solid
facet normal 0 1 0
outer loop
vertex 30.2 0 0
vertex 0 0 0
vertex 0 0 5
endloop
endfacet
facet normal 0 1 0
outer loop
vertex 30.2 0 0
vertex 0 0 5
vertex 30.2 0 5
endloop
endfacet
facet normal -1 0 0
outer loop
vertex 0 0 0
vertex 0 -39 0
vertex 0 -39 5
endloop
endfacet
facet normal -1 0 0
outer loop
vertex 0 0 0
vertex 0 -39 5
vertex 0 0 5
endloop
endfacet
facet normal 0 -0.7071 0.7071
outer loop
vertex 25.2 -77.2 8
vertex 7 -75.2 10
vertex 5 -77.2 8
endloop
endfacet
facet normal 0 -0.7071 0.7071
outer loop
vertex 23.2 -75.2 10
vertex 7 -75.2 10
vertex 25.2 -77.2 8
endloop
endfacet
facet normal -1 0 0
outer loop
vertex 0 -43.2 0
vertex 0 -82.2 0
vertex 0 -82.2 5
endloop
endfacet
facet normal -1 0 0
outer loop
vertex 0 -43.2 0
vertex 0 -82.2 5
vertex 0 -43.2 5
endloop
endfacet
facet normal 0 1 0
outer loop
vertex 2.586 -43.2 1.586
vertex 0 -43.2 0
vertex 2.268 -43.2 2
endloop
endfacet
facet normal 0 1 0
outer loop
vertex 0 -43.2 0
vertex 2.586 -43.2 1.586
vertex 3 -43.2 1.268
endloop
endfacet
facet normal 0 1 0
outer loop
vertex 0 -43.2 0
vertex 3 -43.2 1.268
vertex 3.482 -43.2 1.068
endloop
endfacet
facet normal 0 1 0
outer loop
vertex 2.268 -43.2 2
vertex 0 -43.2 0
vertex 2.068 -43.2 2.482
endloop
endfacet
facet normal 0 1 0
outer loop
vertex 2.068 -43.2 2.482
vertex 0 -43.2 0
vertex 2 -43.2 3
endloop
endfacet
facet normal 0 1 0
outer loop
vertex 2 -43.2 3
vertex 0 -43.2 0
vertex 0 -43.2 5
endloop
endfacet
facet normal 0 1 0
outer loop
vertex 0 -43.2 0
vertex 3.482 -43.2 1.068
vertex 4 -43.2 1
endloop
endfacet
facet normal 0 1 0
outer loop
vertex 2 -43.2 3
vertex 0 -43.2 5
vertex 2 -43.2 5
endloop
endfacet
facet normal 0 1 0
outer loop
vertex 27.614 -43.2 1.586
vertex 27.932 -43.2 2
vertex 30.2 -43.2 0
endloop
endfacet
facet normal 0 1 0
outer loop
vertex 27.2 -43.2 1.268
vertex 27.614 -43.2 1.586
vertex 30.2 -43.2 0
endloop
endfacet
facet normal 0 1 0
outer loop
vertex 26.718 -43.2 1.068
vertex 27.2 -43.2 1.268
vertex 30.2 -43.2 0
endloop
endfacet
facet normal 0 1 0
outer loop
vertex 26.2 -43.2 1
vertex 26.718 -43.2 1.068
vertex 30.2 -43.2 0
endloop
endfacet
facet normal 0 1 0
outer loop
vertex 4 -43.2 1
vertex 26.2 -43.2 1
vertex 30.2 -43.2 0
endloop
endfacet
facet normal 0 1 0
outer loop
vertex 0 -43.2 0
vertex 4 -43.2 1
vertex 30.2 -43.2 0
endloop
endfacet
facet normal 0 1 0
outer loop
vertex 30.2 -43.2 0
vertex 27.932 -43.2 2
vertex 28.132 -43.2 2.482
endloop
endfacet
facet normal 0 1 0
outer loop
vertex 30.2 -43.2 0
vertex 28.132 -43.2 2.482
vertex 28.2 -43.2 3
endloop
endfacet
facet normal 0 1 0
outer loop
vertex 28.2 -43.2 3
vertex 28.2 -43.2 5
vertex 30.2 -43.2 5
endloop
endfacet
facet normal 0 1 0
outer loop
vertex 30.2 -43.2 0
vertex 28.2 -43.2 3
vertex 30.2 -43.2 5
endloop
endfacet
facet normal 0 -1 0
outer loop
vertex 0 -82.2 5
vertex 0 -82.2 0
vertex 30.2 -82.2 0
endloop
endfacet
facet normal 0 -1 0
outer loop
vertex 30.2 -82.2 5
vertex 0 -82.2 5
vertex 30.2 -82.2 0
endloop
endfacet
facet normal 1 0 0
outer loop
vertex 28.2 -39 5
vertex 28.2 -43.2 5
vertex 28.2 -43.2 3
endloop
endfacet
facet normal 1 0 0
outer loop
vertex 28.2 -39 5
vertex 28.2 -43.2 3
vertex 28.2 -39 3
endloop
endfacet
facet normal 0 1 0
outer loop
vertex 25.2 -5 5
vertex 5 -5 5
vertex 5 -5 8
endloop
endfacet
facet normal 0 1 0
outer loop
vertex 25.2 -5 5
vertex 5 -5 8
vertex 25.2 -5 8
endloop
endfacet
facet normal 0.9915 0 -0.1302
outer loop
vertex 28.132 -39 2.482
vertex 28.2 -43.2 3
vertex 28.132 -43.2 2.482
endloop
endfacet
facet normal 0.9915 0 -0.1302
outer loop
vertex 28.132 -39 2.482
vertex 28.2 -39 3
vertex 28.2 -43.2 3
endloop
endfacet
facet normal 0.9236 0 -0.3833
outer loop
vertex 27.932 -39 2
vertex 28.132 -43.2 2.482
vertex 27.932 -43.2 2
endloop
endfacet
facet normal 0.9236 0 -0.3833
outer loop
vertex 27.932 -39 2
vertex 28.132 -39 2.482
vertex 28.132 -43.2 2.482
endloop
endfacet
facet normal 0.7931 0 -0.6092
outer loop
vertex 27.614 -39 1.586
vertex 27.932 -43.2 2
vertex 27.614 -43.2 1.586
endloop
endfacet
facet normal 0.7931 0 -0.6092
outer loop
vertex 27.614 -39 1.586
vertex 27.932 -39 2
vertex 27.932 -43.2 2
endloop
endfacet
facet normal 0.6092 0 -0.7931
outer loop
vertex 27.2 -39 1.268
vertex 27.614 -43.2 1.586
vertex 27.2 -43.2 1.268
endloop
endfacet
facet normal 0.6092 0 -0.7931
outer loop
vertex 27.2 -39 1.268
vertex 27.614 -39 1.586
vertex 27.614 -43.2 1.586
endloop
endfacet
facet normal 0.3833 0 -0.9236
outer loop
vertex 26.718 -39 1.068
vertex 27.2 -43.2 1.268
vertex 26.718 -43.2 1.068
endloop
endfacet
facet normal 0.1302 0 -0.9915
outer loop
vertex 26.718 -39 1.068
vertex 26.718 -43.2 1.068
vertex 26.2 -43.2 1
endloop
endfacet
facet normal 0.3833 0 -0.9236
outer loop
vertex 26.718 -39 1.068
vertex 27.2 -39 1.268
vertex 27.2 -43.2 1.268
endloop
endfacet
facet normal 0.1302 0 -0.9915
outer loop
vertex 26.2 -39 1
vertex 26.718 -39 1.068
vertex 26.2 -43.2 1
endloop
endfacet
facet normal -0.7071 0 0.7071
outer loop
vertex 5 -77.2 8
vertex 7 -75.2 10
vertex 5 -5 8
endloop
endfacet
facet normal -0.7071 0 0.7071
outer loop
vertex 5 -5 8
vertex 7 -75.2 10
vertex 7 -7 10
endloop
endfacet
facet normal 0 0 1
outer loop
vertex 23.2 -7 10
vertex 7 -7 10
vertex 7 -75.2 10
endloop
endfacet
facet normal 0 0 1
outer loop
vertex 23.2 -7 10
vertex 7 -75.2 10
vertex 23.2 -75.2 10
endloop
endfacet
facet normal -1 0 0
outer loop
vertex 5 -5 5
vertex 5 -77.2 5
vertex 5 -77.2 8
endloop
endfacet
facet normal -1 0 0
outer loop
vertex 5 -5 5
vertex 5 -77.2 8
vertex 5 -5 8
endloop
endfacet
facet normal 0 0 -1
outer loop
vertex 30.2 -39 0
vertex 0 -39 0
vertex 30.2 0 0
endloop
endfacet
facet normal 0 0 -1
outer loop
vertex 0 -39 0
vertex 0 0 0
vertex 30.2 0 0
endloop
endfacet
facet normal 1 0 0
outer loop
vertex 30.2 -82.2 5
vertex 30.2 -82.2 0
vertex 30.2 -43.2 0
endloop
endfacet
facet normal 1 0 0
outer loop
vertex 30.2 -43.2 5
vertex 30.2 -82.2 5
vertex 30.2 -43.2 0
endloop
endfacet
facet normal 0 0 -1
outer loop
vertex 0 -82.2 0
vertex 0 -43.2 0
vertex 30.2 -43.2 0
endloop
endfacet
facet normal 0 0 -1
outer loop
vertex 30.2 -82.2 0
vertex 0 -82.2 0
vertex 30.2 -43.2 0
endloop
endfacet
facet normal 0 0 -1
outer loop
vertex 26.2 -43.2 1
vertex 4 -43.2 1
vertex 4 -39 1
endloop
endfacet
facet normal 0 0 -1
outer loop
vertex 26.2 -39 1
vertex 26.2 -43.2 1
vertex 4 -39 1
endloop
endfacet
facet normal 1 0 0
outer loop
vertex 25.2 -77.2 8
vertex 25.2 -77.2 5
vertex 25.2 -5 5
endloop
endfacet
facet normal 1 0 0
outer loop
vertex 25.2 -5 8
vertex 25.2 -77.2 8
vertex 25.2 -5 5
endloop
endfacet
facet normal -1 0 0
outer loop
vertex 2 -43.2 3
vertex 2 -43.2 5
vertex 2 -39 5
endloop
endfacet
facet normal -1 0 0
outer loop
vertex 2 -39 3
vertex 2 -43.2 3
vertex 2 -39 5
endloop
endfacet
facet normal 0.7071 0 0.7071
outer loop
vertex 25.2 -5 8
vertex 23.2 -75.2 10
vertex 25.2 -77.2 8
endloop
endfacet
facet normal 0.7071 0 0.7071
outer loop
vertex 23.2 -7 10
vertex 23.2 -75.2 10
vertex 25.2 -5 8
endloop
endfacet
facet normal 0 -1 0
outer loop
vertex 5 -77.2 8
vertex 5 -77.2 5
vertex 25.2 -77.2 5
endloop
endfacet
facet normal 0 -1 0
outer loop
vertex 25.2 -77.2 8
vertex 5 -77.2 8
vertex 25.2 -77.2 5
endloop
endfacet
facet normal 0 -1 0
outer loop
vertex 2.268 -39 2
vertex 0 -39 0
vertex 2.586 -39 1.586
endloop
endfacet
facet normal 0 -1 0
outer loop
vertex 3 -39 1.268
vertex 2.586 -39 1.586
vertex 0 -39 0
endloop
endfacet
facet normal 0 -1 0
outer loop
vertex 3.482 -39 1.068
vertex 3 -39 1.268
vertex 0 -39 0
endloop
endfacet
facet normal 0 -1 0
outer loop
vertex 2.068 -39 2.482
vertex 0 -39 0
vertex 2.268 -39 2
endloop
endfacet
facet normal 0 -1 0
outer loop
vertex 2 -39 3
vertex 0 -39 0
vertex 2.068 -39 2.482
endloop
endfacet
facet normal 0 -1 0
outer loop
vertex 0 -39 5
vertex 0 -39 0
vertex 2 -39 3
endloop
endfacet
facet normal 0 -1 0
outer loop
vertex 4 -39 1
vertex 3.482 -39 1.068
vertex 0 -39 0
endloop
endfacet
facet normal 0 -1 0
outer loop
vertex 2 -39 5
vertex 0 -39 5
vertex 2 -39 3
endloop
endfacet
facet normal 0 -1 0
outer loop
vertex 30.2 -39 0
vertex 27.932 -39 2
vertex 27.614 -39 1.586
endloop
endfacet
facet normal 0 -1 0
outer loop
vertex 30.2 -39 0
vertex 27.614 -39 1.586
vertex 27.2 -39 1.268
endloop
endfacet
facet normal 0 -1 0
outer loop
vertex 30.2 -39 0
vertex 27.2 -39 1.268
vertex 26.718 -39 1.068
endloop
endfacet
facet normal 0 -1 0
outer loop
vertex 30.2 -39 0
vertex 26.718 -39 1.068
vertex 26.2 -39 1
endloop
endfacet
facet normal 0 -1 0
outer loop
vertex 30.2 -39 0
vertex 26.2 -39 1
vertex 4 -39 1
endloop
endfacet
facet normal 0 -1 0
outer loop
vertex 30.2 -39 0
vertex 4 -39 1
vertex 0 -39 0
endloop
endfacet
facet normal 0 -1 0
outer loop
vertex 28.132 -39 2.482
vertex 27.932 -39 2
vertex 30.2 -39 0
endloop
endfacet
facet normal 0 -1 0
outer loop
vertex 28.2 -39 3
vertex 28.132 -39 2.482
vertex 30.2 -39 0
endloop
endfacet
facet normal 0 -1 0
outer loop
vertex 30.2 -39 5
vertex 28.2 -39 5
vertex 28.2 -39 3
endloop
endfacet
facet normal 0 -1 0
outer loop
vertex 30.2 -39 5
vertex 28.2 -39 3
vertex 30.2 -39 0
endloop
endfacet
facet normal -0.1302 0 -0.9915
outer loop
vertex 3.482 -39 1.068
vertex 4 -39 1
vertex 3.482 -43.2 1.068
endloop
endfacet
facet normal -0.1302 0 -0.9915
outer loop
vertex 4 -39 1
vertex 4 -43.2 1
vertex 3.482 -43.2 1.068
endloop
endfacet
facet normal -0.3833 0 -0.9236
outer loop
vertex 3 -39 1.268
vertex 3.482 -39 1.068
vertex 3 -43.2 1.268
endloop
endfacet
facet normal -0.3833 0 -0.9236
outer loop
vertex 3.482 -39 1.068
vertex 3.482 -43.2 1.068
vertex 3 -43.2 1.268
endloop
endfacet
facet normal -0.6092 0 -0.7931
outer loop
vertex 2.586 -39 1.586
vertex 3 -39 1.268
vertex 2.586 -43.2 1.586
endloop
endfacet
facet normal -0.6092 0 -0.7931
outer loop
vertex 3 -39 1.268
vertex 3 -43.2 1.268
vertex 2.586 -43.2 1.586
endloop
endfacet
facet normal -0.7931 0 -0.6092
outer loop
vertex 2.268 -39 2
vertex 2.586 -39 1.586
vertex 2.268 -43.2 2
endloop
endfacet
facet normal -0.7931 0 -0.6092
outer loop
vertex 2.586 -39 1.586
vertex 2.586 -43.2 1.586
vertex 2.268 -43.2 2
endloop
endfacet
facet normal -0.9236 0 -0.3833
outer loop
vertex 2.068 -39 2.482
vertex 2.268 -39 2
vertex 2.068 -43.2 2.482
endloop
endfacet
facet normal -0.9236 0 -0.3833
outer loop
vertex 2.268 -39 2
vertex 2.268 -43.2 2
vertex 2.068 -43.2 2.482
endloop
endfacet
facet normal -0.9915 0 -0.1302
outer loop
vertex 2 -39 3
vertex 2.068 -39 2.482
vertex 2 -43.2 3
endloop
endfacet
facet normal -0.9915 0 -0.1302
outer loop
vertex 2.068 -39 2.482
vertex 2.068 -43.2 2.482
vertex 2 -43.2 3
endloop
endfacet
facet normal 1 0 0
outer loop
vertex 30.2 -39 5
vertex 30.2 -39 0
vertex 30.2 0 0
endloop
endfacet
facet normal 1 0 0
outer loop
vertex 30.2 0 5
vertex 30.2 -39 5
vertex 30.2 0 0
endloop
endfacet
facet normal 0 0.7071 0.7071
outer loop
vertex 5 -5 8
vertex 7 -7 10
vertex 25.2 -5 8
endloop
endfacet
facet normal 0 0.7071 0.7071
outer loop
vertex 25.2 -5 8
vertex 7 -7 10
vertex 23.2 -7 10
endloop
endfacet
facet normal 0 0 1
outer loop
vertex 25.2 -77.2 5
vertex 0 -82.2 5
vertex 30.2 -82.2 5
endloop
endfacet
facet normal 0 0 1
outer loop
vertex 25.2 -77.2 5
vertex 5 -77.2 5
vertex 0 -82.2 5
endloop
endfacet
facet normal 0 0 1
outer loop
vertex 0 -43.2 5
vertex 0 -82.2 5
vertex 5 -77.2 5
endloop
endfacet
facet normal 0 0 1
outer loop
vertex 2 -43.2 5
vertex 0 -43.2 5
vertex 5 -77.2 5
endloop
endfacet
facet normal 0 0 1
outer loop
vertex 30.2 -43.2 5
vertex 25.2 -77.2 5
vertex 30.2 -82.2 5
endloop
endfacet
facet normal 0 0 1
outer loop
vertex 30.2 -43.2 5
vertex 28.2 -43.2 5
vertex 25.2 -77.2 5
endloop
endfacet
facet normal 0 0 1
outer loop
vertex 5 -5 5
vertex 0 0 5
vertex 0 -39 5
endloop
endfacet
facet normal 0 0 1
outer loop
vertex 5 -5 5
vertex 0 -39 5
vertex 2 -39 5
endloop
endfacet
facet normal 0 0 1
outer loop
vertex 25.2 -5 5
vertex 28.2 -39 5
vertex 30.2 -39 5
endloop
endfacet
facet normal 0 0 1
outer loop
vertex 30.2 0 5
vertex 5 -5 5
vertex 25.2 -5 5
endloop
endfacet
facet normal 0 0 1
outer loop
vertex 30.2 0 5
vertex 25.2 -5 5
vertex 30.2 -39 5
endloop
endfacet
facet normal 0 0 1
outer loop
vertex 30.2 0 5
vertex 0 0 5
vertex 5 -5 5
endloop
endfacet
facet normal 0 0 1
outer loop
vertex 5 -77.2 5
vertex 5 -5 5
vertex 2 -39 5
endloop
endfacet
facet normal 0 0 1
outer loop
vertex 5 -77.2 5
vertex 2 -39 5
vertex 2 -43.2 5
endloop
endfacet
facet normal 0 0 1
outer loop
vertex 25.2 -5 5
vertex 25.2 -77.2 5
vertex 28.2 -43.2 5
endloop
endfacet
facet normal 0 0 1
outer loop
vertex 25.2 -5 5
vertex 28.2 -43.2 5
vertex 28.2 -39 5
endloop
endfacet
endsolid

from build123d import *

# Parameters (mm, degrees)
F0_W     = 30.2
F0_H     = 82.2
F1_DEPTH = 5
F2_W     = 20.2
F2_H     = 72.2
F3_DEPTH = 5
F4_SIZE  = 2
F5_W     = 2
F5_H     = 4.2
F6_DEPTH = 5
F7_W     = 4.2
F7_H     = 1
F8_DEPTH = 28.2
F9_R     = 2


with BuildPart() as f1:
    # F0 (on Top) → F1 (new body)
    with BuildSketch(Plane.XY):
        with Locations((15.1, -41.1)):
            Rectangle(F0_W, F0_H)
    extrude(amount=F1_DEPTH)

    # F2 (on face) → F3 (join)
    with BuildSketch(Plane.XY.offset(5)):
        with Locations((15.1, -41.1)):
            Rectangle(F2_W, F2_H)
    extrude(amount=F3_DEPTH)

    # F4
    f4_edges = [f1.edges().sort_by_distance(p)[0] for p in [
        (15.1, -5, 10),
        (5, -41.1, 10),
        (15.1, -77.2, 10),
        (25.2, -41.1, 10),
    ]]
    chamfer(f4_edges, length=F4_SIZE)

    # F5 (on face) → F6 (cut, through all)
    with BuildSketch(Plane.XY.offset(5)):
        with Locations((1, -41.1)):
            Rectangle(F5_W, F5_H)
        with Locations((29.2, -41.1)):
            Rectangle(F5_W, F5_H)
    extrude(amount=-F6_DEPTH, mode=Mode.SUBTRACT)

    # F7 (on Right) → F8 (cut, through all)
    with BuildSketch(Plane.YZ):
        with Locations((-41.1, 0.5)):
            Rectangle(F7_W, F7_H)
    extrude(amount=F8_DEPTH, mode=Mode.SUBTRACT)

    # F9
    f9_edges = [f1.edges().sort_by_distance(p)[0] for p in [
        (2, -41.1, 1),
        (28.2, -41.1, 1),
    ]]
    fillet(f9_edges, radius=F9_R)


solid = f1.part
